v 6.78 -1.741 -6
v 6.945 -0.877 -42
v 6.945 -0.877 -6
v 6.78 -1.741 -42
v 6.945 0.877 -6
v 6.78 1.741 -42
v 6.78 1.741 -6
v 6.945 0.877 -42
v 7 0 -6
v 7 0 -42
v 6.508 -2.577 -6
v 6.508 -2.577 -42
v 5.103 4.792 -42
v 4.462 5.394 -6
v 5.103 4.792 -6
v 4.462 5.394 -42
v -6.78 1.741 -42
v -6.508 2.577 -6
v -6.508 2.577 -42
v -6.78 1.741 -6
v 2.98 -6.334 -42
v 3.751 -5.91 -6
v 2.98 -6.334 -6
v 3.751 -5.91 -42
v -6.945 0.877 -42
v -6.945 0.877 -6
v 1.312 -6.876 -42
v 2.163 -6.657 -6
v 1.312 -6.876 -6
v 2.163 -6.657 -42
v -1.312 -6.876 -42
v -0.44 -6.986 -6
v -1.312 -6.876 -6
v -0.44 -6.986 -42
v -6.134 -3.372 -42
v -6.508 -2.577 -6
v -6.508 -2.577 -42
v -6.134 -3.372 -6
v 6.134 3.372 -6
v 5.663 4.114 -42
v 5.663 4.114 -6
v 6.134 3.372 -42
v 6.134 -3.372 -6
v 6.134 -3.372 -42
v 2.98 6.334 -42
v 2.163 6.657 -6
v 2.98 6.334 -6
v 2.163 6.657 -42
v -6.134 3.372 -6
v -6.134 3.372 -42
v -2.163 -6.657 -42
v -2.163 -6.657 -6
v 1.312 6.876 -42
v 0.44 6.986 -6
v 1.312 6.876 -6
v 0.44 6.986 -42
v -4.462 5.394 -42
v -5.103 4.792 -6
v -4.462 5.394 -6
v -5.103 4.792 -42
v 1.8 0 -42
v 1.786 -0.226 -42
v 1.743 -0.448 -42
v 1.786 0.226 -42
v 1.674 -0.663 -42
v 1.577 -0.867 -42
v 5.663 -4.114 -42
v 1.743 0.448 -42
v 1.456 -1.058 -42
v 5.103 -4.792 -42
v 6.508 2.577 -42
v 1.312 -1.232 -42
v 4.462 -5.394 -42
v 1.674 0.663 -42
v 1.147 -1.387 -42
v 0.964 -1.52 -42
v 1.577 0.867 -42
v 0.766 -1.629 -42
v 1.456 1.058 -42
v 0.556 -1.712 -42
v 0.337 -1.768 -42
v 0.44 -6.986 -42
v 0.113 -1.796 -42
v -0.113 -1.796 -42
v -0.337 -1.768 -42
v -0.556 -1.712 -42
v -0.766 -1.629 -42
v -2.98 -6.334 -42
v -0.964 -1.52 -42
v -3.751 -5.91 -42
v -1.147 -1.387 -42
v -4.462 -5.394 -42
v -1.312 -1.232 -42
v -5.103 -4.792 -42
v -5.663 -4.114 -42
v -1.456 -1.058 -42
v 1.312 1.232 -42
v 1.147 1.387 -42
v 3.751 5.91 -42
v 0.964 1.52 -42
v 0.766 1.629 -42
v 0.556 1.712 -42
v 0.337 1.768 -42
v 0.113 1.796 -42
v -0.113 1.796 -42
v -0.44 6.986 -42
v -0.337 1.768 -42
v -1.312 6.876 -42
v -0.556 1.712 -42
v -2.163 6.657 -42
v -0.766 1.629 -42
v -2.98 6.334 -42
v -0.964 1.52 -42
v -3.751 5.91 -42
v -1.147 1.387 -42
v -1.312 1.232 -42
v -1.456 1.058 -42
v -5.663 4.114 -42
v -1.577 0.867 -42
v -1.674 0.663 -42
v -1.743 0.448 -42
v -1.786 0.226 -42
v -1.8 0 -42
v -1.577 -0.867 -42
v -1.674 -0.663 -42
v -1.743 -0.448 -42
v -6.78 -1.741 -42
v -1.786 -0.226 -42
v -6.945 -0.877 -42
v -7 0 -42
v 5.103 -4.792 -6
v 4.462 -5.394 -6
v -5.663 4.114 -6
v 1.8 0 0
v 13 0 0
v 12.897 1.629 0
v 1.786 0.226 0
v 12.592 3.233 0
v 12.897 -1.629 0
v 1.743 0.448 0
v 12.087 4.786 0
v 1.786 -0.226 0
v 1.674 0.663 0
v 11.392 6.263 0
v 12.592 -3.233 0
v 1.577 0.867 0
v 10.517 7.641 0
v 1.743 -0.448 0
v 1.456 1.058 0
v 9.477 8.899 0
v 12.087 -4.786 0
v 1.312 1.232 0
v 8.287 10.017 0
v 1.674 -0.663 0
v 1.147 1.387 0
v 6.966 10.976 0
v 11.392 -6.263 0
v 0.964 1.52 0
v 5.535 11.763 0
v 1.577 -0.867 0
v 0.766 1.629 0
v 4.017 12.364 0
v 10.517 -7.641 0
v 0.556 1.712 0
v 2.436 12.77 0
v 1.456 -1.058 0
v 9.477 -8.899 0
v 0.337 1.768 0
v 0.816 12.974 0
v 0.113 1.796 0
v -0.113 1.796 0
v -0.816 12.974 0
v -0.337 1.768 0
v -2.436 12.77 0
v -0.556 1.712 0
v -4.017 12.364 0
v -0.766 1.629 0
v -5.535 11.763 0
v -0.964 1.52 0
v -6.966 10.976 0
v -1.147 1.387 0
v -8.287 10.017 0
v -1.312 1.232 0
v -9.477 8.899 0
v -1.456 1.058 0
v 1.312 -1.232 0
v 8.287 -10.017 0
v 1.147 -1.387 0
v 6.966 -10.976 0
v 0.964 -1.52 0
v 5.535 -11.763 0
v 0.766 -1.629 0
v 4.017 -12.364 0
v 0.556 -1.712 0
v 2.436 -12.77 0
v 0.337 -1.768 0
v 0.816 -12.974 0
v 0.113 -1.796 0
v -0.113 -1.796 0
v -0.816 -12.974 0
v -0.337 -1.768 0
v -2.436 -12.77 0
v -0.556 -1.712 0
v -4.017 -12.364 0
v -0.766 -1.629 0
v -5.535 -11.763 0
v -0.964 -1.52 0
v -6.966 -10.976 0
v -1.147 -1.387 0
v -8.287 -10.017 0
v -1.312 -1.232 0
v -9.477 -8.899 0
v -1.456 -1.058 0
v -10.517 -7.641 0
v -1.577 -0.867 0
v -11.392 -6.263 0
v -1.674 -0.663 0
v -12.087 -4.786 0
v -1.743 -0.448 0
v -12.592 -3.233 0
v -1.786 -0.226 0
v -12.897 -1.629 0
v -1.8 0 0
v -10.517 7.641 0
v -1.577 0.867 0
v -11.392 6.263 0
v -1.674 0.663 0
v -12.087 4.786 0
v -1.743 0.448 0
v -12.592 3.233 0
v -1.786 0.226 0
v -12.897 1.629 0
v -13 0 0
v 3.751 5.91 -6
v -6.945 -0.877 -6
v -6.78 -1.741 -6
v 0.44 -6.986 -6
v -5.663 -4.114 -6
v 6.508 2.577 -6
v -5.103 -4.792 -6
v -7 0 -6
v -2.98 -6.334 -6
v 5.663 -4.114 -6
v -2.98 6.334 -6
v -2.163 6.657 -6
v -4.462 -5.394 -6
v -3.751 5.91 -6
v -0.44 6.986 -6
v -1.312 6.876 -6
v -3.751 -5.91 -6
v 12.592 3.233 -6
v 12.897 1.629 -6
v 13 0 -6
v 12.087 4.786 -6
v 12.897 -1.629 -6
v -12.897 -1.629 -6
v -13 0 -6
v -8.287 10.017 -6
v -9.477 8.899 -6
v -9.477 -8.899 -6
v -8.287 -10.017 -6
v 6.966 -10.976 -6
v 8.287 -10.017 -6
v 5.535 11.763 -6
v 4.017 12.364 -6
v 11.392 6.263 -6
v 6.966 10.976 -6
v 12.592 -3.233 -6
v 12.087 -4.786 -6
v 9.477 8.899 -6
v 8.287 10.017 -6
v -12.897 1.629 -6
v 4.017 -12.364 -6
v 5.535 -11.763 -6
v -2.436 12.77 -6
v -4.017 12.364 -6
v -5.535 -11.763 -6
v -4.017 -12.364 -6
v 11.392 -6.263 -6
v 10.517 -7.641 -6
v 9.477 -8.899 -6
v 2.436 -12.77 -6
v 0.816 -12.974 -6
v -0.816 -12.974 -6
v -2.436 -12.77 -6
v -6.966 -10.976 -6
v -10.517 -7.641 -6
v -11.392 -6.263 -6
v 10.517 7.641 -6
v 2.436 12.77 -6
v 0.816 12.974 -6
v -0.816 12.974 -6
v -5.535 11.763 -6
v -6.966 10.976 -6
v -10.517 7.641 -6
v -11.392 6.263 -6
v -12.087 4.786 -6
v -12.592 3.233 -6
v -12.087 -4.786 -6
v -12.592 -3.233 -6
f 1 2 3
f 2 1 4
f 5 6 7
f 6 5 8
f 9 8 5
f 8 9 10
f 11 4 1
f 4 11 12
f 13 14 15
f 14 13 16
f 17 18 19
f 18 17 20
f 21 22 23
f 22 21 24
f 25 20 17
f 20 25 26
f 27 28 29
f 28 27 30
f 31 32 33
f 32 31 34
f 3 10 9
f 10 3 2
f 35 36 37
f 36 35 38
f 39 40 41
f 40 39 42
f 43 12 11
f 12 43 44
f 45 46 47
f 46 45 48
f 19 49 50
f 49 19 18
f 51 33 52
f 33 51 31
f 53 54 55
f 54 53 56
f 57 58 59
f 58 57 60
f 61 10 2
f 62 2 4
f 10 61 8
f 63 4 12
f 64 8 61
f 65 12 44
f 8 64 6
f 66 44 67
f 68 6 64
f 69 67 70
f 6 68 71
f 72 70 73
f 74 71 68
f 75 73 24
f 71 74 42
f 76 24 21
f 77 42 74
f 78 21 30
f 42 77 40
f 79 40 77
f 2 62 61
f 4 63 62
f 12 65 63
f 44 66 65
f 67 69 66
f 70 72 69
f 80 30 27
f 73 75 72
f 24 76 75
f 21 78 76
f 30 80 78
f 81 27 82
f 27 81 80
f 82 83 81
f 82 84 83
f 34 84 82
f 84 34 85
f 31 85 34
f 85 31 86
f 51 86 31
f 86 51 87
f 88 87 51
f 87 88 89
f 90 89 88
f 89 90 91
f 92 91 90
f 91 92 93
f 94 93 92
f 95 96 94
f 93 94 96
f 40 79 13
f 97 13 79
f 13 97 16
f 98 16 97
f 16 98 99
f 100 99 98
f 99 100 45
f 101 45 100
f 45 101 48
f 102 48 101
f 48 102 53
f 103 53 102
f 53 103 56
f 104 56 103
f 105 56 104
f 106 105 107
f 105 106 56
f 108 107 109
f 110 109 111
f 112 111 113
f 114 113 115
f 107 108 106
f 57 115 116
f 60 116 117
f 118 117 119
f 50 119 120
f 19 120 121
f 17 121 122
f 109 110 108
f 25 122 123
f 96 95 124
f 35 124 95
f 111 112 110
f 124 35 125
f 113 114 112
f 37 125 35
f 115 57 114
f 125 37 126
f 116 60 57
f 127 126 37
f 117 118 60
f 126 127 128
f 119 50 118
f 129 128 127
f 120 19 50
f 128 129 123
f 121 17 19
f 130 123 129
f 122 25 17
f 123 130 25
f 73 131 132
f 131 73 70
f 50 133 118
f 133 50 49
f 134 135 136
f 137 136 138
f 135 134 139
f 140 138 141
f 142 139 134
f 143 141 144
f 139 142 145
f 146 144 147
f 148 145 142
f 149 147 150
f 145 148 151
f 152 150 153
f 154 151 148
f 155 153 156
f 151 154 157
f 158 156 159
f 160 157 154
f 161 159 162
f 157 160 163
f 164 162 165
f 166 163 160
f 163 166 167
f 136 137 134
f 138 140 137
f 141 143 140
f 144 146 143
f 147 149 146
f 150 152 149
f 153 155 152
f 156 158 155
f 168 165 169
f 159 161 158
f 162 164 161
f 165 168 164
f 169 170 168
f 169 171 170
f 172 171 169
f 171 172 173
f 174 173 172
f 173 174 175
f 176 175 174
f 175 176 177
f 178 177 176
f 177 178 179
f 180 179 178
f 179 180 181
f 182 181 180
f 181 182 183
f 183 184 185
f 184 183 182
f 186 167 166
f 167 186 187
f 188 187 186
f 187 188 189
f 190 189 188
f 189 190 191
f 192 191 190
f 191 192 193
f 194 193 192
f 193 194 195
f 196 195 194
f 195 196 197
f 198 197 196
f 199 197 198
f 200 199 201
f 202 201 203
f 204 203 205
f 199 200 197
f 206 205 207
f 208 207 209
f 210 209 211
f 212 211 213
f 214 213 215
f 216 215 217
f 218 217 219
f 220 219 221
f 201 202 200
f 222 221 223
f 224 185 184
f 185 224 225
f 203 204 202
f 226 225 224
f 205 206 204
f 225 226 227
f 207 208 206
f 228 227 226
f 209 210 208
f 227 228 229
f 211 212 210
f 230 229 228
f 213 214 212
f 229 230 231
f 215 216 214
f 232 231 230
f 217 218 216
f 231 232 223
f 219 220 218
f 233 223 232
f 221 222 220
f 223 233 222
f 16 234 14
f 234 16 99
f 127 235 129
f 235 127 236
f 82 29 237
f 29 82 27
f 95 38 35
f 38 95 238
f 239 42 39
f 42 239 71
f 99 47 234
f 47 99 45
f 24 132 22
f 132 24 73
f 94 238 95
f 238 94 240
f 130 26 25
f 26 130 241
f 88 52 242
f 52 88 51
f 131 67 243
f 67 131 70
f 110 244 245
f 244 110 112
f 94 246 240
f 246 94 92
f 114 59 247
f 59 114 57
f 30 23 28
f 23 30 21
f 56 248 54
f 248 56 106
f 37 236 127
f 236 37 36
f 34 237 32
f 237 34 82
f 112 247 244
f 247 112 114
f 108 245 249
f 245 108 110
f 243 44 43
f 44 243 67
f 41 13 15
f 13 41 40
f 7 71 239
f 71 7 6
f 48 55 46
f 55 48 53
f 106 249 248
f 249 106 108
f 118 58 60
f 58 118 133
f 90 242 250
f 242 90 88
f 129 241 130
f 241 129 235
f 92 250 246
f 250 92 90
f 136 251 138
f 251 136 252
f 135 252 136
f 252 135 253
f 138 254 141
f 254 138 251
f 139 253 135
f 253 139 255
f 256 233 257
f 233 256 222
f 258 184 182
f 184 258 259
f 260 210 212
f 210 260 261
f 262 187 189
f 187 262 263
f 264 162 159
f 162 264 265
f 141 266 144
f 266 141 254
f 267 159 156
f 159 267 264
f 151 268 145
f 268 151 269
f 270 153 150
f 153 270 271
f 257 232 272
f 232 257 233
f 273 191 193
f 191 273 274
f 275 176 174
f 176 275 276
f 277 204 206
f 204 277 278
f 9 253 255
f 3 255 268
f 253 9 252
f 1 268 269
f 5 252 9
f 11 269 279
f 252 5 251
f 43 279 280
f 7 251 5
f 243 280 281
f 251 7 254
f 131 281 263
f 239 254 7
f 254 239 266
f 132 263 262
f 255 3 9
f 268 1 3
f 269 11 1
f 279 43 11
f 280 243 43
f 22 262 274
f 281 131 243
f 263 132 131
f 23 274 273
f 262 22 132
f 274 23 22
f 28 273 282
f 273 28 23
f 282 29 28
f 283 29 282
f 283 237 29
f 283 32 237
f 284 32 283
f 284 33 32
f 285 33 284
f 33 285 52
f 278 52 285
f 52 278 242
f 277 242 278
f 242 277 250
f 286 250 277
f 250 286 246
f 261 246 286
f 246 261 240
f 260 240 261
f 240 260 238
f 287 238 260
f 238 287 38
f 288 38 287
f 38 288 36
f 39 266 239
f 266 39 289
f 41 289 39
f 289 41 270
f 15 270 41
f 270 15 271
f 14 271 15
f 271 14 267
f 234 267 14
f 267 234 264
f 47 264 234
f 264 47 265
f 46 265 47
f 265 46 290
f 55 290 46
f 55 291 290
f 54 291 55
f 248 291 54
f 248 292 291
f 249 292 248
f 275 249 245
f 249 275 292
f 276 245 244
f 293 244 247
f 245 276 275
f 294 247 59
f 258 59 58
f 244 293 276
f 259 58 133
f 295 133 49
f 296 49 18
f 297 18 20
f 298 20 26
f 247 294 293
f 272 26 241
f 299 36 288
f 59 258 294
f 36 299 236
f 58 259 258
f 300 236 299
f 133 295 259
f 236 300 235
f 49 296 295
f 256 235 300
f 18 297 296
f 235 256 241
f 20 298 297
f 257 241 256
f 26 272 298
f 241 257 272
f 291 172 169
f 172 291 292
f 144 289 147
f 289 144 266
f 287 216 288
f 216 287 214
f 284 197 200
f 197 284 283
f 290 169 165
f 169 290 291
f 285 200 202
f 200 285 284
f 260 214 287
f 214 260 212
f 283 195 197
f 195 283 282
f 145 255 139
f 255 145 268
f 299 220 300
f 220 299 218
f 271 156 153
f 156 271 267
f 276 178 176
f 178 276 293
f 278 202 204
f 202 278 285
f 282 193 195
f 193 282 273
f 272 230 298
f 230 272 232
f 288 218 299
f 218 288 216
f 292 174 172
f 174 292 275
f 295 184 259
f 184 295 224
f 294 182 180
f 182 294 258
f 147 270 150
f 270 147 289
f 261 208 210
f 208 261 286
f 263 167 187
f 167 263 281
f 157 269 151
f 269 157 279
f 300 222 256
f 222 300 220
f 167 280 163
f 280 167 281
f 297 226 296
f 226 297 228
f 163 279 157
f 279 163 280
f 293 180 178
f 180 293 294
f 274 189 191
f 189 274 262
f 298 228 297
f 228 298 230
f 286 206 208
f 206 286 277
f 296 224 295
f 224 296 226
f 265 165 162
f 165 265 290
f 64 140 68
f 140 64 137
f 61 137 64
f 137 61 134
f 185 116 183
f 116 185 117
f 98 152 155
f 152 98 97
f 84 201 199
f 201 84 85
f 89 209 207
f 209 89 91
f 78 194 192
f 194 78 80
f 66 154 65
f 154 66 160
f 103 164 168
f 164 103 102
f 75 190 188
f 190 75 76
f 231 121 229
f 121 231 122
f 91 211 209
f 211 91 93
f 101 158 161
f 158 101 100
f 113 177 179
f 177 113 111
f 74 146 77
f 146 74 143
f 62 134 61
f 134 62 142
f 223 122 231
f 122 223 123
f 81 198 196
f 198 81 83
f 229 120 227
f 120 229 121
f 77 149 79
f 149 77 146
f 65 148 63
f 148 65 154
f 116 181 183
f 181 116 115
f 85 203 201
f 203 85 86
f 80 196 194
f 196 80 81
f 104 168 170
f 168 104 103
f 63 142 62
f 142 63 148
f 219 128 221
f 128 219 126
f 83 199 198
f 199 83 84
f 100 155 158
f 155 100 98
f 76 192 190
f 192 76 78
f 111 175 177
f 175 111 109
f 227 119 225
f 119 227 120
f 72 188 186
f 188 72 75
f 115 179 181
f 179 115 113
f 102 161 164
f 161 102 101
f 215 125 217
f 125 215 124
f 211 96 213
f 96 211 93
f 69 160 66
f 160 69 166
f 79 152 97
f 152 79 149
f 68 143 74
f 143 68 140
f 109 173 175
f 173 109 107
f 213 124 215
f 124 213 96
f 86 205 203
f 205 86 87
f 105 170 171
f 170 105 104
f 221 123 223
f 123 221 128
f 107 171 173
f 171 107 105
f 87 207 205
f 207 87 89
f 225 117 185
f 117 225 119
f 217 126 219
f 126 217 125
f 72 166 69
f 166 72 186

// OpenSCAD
$fn = 50;


difference() {
	union() {
		translate(v = [0, 0, -42.0000000000]) {
			cylinder(h = 42, r = 7.0000000000);
		}
		translate(v = [0, 0, -6.0000000000]) {
			cylinder(h = 6, r = 13.0000000000);
		}
	}
	union() {
		#translate(v = [0, 0, -42]) {
			cylinder(h = 42, r = 1.8000000000);
		}
	}
}
